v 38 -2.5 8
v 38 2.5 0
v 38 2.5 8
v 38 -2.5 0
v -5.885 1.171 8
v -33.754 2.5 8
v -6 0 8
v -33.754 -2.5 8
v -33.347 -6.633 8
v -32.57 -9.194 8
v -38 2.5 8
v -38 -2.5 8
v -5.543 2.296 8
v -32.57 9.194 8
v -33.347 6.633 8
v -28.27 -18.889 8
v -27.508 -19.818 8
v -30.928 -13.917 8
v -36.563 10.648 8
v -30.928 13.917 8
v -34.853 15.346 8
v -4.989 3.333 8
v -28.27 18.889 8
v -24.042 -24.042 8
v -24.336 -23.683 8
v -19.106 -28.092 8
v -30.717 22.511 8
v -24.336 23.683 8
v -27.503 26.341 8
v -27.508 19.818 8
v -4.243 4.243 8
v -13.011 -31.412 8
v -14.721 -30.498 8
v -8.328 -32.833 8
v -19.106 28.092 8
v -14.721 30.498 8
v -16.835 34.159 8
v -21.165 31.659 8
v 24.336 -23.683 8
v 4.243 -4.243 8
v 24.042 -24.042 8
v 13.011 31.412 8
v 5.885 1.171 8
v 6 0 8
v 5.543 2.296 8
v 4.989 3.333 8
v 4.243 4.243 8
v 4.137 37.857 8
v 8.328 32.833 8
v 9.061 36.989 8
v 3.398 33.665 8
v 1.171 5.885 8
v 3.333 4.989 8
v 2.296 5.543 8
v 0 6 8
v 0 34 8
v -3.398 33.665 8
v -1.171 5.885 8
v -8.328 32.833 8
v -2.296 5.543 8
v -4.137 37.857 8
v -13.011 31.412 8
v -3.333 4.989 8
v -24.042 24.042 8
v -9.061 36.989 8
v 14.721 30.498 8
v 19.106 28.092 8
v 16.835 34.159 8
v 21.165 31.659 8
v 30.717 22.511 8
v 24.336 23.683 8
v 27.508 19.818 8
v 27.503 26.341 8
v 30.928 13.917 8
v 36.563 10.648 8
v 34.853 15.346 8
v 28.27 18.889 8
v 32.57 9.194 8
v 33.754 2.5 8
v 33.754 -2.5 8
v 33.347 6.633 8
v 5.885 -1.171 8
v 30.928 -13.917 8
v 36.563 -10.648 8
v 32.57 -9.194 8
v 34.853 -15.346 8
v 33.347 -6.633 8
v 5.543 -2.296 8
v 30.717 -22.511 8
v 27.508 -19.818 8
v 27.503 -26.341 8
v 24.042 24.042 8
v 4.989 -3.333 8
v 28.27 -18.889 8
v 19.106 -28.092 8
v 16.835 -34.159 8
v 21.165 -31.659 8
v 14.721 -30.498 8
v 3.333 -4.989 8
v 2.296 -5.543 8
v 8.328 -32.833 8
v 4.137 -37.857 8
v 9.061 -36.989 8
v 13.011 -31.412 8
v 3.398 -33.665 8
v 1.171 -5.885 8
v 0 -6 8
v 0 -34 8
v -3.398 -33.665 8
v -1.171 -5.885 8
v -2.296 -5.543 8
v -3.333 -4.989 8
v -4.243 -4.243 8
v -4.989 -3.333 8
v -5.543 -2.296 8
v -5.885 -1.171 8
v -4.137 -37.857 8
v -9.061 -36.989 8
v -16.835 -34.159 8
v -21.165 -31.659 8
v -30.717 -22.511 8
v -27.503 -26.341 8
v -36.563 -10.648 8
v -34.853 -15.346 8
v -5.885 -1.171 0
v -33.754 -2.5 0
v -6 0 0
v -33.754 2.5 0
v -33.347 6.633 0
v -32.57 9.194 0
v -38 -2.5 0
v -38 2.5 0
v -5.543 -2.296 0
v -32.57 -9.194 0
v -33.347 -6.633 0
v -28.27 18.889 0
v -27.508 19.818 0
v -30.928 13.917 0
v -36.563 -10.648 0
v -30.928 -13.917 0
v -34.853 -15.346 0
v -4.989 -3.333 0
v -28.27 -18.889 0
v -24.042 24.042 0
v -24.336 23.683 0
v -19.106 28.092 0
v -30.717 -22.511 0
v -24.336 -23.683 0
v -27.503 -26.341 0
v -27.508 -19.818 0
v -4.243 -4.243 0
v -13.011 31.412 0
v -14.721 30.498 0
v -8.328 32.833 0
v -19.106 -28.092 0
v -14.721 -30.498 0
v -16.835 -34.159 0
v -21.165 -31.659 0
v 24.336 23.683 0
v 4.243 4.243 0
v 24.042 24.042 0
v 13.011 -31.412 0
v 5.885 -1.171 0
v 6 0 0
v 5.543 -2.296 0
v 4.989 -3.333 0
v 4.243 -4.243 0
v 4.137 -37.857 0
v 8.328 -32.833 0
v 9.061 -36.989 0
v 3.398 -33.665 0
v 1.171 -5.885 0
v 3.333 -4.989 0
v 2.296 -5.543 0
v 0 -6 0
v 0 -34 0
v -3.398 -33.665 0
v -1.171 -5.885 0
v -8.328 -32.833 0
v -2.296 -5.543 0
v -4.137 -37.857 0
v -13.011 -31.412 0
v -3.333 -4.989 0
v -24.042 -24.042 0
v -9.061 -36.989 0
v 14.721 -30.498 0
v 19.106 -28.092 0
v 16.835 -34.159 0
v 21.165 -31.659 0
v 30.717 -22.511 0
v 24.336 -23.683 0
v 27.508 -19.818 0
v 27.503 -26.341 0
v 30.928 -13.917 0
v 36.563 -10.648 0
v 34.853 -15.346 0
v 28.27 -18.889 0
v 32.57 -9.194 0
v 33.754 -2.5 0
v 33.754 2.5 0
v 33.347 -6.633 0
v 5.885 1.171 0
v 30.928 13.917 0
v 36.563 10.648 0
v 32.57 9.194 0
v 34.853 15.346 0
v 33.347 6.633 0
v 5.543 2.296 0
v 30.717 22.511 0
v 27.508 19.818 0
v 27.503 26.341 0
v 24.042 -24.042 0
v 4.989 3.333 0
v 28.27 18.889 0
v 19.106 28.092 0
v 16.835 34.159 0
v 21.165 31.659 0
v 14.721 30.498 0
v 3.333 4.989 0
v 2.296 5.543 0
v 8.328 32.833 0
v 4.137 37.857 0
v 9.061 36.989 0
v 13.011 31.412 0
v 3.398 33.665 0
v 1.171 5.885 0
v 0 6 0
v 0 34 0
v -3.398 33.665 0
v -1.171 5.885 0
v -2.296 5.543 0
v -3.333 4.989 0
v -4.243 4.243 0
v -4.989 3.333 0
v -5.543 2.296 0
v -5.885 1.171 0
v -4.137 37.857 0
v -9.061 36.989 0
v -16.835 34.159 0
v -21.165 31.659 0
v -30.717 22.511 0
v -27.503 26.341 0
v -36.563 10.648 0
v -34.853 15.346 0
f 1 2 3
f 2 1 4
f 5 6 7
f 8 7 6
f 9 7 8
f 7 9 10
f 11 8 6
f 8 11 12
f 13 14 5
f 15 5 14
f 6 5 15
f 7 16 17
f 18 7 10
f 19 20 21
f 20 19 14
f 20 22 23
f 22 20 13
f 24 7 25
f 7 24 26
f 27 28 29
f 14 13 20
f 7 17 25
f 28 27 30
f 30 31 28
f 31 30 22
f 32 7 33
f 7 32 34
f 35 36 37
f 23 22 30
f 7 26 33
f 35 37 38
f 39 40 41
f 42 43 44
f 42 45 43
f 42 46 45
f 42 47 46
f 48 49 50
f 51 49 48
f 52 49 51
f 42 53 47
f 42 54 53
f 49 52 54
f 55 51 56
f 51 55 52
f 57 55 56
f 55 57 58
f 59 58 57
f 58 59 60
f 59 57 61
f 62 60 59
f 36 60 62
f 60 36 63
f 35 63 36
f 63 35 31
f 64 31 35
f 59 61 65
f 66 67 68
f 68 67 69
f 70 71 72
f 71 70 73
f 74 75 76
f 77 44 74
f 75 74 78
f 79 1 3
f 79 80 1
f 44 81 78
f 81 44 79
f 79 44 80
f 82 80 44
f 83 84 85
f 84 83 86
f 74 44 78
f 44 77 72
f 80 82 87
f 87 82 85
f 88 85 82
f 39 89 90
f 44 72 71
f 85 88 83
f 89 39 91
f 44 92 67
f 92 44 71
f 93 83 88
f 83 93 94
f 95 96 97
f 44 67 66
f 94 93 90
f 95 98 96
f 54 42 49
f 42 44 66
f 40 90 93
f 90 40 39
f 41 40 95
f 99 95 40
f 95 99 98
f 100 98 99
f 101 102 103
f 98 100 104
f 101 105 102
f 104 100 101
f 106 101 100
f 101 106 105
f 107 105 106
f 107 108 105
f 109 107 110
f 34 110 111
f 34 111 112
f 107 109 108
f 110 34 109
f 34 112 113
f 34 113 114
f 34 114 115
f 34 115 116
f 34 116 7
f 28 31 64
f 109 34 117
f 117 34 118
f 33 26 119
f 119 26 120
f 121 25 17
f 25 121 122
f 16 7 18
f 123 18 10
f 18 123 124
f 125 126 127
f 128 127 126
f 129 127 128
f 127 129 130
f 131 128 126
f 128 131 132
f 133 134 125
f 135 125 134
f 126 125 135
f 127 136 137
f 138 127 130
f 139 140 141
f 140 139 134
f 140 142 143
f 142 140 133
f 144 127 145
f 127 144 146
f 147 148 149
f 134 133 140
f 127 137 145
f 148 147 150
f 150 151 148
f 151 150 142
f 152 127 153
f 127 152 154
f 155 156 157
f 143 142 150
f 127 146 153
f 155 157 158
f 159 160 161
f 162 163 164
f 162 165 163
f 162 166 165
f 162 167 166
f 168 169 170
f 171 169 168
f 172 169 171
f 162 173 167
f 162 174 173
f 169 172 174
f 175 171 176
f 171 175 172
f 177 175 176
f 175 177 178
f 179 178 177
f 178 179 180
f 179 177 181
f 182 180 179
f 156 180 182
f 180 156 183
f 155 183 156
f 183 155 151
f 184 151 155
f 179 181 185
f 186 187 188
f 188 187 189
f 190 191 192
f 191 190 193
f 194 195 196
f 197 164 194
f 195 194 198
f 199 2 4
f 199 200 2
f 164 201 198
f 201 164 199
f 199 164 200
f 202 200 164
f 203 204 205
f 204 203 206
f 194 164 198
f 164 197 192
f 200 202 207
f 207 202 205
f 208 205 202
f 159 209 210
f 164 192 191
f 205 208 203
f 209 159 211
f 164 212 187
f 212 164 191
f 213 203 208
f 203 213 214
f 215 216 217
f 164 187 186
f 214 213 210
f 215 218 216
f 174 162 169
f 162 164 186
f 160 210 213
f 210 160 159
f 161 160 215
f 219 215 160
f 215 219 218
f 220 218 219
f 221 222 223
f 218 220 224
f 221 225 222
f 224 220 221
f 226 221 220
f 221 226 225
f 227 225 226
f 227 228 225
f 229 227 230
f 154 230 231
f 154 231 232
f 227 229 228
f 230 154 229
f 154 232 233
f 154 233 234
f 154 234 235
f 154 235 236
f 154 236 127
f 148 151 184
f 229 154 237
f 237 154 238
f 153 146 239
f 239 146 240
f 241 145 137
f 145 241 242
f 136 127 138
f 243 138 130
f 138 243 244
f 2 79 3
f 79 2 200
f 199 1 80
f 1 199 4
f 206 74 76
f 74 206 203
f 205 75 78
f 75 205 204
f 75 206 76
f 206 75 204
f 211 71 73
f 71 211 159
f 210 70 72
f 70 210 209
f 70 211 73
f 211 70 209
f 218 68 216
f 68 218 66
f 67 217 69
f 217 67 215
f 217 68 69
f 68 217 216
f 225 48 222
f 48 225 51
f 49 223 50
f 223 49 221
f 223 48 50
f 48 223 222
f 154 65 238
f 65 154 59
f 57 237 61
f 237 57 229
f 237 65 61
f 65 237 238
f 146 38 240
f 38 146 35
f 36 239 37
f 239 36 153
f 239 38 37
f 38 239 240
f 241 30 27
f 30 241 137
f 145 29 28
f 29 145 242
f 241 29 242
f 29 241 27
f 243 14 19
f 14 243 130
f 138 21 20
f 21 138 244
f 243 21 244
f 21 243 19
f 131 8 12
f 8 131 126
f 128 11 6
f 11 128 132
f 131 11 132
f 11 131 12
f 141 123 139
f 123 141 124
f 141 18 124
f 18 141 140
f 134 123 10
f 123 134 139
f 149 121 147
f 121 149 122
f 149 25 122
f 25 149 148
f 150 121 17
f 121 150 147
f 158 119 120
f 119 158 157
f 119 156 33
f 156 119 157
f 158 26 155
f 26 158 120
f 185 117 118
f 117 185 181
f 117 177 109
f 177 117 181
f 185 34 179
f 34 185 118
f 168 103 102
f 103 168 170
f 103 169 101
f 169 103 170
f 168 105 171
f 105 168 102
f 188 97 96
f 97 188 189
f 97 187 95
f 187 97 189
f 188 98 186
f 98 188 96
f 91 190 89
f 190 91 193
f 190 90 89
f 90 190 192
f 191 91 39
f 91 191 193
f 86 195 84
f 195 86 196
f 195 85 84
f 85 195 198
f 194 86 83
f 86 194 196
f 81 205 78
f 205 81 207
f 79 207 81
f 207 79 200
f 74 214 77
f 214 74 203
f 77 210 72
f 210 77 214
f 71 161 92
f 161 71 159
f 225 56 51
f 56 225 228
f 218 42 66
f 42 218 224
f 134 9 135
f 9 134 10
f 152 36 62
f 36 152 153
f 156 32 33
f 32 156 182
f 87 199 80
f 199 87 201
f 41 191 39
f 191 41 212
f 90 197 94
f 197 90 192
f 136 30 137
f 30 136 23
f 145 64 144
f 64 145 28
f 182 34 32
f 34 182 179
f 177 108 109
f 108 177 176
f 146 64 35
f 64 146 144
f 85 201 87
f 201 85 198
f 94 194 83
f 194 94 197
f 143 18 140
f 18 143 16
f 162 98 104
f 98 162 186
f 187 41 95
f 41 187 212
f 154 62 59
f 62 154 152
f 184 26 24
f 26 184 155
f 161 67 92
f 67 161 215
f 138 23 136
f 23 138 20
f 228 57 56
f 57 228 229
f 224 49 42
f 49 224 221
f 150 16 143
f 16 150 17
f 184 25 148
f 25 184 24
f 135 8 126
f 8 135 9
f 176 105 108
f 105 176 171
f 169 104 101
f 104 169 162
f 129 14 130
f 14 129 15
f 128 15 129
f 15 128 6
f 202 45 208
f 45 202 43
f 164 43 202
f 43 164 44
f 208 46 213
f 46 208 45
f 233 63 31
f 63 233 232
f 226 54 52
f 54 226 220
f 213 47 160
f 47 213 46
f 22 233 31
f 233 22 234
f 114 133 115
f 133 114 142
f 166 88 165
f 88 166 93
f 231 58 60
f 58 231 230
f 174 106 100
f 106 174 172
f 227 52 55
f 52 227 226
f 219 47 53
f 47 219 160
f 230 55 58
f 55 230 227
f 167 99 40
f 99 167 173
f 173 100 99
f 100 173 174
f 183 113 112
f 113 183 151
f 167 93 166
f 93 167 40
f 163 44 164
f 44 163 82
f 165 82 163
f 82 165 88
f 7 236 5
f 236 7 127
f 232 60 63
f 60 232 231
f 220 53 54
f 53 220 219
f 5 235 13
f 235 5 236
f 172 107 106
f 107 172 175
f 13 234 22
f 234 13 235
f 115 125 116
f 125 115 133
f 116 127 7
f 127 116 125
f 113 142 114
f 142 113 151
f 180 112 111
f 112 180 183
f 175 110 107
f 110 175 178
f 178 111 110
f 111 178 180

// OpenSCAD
$fn = 32;

// ----------------------------------------------------------------------
// Spur blank: bored gear blank
// ----------------------------------------------------------------------

// --- parameters (mm) ---
disc_r = 34;              // blank root radius
disc_t = 8;               // blank thickness
n_teeth = 18;             // stub tooth count
tooth_w = 5;              // tooth width at the root
tooth_h = 4;              // tooth height above the root
bore_r = 6;               // central bore radius

out_r = disc_r + tooth_h;  // tip radius
bbox_x = 76.0;  // measured width over the teeth
bbox_y = 75.71;  // measured depth over the teeth

difference() {
union() {
  cylinder(r = disc_r, h = disc_t);
  for (i = [0 : n_teeth - 1])
    rotate([0, 0, i * 360 / n_teeth])
      translate([disc_r - 1, -tooth_w / 2, 0])
        cube([tooth_h + 1, tooth_w, disc_t]);
}
  translate([0, 0, -1]) cylinder(r = bore_r, h = disc_t + 2);
}
